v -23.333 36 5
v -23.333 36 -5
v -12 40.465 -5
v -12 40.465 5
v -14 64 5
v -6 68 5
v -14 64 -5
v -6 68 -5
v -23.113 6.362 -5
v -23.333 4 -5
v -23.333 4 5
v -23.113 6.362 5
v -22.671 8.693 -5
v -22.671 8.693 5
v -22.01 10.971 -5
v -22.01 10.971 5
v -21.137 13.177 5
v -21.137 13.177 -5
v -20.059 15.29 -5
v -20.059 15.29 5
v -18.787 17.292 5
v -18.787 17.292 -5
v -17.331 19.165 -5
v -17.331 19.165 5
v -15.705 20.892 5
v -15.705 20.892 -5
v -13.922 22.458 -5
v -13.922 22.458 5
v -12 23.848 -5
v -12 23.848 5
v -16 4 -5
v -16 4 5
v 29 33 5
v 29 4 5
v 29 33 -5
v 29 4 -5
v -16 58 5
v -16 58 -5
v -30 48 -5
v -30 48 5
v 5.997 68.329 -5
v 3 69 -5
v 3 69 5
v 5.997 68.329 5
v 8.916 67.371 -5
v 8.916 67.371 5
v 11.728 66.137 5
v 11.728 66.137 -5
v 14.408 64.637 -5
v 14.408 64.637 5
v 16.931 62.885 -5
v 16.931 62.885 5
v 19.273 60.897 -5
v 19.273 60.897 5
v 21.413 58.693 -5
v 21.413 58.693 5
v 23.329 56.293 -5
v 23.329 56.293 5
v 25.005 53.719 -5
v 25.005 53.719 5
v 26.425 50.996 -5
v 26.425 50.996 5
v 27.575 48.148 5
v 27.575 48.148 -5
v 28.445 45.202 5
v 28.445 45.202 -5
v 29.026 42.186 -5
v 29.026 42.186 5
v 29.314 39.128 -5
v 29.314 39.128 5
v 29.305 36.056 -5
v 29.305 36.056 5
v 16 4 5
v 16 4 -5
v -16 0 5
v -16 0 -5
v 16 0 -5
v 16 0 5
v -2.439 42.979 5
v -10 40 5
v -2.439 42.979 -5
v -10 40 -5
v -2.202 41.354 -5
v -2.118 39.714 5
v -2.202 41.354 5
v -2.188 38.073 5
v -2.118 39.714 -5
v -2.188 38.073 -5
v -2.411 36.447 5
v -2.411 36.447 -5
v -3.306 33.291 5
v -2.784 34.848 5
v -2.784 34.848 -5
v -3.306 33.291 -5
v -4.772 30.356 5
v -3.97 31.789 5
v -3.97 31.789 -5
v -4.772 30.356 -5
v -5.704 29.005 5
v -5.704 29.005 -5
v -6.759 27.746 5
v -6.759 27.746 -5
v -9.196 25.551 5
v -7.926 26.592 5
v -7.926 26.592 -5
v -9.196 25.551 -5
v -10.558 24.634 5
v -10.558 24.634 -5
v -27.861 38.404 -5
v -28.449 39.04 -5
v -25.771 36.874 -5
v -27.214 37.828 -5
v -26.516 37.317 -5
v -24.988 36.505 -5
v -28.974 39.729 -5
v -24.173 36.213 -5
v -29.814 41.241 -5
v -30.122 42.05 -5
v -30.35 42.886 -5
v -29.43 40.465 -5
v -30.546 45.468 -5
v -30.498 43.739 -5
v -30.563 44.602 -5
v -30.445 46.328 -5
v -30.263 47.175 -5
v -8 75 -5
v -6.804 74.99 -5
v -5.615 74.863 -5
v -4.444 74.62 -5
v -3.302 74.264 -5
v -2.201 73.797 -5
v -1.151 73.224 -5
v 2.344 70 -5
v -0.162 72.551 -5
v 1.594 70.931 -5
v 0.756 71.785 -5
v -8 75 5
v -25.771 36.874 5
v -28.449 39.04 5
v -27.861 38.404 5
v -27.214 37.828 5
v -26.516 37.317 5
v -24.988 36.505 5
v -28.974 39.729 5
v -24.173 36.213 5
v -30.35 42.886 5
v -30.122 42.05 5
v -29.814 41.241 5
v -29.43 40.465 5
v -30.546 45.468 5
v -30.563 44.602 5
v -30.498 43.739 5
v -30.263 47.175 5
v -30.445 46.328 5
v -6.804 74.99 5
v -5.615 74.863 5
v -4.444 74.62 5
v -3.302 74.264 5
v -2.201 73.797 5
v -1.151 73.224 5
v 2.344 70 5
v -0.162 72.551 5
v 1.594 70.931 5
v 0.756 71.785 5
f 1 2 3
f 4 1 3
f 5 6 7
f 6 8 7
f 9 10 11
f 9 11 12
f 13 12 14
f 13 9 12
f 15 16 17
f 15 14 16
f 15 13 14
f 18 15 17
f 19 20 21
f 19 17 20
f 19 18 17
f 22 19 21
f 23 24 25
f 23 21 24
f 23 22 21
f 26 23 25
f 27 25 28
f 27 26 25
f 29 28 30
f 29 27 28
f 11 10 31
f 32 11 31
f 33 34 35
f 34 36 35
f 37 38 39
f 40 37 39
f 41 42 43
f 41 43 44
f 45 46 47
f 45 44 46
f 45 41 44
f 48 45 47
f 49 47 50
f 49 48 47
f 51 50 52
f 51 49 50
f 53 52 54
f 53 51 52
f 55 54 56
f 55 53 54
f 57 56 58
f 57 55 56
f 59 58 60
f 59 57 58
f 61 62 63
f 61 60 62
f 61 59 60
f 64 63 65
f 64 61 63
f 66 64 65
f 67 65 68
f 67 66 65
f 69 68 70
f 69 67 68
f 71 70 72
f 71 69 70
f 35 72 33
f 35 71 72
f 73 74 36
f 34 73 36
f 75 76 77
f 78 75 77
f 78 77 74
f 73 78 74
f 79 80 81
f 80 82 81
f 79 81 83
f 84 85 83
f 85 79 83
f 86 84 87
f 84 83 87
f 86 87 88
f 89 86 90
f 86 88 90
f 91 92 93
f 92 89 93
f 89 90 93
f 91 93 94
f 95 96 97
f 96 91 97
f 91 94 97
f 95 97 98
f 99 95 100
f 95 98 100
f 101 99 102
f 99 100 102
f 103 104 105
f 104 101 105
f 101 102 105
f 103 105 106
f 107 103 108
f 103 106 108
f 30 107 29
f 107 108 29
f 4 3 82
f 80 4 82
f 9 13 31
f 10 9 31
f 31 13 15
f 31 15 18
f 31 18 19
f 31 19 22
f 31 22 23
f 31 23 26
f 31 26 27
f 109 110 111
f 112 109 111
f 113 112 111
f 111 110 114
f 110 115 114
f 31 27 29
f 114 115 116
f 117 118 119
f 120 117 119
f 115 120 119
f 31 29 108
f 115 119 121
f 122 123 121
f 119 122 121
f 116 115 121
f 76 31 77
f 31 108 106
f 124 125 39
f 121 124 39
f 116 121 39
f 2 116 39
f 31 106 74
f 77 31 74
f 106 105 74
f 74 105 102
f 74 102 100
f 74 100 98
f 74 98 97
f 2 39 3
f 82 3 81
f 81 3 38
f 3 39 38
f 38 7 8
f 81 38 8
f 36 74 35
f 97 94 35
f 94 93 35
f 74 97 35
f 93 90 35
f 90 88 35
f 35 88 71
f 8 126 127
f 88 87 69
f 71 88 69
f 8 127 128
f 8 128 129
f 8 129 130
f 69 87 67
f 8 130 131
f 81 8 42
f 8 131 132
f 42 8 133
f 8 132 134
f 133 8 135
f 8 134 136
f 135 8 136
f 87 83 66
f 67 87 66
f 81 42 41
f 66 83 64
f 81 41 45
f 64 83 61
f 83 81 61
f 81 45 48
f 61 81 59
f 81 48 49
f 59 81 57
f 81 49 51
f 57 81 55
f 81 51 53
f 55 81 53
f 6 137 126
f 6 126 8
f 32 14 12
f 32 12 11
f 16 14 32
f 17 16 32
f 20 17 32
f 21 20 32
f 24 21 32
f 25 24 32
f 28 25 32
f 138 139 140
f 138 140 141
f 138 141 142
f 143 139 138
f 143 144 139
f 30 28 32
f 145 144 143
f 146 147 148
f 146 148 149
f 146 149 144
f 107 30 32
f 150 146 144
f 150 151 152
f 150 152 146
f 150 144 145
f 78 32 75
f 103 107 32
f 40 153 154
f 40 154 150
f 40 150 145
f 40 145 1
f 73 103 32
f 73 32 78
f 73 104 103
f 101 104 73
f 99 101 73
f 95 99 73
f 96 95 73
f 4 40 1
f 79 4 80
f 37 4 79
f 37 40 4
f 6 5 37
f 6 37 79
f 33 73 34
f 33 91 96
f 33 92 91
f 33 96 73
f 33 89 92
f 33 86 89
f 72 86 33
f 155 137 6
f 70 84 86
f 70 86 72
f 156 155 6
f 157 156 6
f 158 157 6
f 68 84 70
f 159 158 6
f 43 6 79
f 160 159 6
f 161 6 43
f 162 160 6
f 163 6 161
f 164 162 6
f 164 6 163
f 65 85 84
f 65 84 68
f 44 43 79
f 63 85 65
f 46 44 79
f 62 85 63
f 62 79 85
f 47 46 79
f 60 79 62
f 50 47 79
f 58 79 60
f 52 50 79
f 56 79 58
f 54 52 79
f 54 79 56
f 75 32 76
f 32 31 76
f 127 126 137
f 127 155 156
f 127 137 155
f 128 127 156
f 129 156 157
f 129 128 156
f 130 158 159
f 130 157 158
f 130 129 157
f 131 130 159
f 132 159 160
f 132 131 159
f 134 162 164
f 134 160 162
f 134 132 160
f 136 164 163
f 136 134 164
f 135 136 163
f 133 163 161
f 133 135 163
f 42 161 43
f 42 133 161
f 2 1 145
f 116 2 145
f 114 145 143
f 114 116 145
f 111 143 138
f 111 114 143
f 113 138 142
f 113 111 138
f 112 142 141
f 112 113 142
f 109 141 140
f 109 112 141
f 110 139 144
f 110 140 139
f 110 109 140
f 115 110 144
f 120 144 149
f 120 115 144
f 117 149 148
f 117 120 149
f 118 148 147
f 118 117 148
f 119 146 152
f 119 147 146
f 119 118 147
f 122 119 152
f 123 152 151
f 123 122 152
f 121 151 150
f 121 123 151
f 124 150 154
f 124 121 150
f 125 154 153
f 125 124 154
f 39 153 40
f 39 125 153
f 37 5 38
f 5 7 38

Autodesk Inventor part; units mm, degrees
ref_plane "YZ Plane" through (0, 0, 0) normal (1, 0, 0) x (0, 1, 0)
ref_plane "XZ Plane" through (0, 0, 0) normal (0, 1, 0) x (-1, 0, 0)
ref_plane "XY Plane" through (0, 0, 0) normal (0, 0, 1) x (1, 0, 0)
sketch "Boceto1" plane through (0, 0, 0) normal (0, 0, 1) x (1, 0, 0)
  line L0 (-70.4693, 87.7725) -> (72.3878, 87.7725) construction
  line L1 (72.3878, 87.7725) -> (72.3878, -52.7037) construction
  line L2 (72.3878, -52.7037) -> (-70.4693, -52.7037) construction
  line L3 (-70.4693, -52.7037) -> (-70.4693, 87.7725) construction
  line L4 (-16, 0) -> (16, 0)
  line L5 (16, 0) -> (16, 4)
  line L6 (16, 4) -> (29, 4)
  line L7 (29, 4) -> (29, 33)
  arc A0 (29, 33) -> (3, 69) centre (-2.439, 37.6829) ccw
  arc A1 (3, 69) -> (-8, 75) centre (-7.5, 62.8333) ccw
  line L8 (-8, 75) -> (-6, 68)
  line L9 (-6, 68) -> (-14, 64)
  line L10 (-14, 64) -> (-16, 58)
  line L11 (-16, 58) -> (-30, 48)
  arc A2 (-30, 48) -> (-23.3333, 36) centre (-21.5351, 44.8509) ccw
  line L12 (-23.3333, 36) -> (-12, 40.4647)
  line L13 (-12, 40.4647) -> (-10, 40)
  line L14 (-10, 40) -> (-2.439, 42.9786)
  arc A3 (-12, 23.8479) -> (-2.439, 42.9786) centre (-19.6735, 39.6374) ccw
  arc A4 (-12, 23.8479) -> (-23.3333, 4) centre (1.7175, 2.8554) ccw
  line L15 (-23.3333, 4) -> (-16, 4)
  line L16 (-16, 4) -> (-16, 0)
  point P0 (0, 0)
extrude "Extrusión1" add sketch "Boceto1" along normal mid plane 10
properties part number "KIGTH TOP 1.0"
